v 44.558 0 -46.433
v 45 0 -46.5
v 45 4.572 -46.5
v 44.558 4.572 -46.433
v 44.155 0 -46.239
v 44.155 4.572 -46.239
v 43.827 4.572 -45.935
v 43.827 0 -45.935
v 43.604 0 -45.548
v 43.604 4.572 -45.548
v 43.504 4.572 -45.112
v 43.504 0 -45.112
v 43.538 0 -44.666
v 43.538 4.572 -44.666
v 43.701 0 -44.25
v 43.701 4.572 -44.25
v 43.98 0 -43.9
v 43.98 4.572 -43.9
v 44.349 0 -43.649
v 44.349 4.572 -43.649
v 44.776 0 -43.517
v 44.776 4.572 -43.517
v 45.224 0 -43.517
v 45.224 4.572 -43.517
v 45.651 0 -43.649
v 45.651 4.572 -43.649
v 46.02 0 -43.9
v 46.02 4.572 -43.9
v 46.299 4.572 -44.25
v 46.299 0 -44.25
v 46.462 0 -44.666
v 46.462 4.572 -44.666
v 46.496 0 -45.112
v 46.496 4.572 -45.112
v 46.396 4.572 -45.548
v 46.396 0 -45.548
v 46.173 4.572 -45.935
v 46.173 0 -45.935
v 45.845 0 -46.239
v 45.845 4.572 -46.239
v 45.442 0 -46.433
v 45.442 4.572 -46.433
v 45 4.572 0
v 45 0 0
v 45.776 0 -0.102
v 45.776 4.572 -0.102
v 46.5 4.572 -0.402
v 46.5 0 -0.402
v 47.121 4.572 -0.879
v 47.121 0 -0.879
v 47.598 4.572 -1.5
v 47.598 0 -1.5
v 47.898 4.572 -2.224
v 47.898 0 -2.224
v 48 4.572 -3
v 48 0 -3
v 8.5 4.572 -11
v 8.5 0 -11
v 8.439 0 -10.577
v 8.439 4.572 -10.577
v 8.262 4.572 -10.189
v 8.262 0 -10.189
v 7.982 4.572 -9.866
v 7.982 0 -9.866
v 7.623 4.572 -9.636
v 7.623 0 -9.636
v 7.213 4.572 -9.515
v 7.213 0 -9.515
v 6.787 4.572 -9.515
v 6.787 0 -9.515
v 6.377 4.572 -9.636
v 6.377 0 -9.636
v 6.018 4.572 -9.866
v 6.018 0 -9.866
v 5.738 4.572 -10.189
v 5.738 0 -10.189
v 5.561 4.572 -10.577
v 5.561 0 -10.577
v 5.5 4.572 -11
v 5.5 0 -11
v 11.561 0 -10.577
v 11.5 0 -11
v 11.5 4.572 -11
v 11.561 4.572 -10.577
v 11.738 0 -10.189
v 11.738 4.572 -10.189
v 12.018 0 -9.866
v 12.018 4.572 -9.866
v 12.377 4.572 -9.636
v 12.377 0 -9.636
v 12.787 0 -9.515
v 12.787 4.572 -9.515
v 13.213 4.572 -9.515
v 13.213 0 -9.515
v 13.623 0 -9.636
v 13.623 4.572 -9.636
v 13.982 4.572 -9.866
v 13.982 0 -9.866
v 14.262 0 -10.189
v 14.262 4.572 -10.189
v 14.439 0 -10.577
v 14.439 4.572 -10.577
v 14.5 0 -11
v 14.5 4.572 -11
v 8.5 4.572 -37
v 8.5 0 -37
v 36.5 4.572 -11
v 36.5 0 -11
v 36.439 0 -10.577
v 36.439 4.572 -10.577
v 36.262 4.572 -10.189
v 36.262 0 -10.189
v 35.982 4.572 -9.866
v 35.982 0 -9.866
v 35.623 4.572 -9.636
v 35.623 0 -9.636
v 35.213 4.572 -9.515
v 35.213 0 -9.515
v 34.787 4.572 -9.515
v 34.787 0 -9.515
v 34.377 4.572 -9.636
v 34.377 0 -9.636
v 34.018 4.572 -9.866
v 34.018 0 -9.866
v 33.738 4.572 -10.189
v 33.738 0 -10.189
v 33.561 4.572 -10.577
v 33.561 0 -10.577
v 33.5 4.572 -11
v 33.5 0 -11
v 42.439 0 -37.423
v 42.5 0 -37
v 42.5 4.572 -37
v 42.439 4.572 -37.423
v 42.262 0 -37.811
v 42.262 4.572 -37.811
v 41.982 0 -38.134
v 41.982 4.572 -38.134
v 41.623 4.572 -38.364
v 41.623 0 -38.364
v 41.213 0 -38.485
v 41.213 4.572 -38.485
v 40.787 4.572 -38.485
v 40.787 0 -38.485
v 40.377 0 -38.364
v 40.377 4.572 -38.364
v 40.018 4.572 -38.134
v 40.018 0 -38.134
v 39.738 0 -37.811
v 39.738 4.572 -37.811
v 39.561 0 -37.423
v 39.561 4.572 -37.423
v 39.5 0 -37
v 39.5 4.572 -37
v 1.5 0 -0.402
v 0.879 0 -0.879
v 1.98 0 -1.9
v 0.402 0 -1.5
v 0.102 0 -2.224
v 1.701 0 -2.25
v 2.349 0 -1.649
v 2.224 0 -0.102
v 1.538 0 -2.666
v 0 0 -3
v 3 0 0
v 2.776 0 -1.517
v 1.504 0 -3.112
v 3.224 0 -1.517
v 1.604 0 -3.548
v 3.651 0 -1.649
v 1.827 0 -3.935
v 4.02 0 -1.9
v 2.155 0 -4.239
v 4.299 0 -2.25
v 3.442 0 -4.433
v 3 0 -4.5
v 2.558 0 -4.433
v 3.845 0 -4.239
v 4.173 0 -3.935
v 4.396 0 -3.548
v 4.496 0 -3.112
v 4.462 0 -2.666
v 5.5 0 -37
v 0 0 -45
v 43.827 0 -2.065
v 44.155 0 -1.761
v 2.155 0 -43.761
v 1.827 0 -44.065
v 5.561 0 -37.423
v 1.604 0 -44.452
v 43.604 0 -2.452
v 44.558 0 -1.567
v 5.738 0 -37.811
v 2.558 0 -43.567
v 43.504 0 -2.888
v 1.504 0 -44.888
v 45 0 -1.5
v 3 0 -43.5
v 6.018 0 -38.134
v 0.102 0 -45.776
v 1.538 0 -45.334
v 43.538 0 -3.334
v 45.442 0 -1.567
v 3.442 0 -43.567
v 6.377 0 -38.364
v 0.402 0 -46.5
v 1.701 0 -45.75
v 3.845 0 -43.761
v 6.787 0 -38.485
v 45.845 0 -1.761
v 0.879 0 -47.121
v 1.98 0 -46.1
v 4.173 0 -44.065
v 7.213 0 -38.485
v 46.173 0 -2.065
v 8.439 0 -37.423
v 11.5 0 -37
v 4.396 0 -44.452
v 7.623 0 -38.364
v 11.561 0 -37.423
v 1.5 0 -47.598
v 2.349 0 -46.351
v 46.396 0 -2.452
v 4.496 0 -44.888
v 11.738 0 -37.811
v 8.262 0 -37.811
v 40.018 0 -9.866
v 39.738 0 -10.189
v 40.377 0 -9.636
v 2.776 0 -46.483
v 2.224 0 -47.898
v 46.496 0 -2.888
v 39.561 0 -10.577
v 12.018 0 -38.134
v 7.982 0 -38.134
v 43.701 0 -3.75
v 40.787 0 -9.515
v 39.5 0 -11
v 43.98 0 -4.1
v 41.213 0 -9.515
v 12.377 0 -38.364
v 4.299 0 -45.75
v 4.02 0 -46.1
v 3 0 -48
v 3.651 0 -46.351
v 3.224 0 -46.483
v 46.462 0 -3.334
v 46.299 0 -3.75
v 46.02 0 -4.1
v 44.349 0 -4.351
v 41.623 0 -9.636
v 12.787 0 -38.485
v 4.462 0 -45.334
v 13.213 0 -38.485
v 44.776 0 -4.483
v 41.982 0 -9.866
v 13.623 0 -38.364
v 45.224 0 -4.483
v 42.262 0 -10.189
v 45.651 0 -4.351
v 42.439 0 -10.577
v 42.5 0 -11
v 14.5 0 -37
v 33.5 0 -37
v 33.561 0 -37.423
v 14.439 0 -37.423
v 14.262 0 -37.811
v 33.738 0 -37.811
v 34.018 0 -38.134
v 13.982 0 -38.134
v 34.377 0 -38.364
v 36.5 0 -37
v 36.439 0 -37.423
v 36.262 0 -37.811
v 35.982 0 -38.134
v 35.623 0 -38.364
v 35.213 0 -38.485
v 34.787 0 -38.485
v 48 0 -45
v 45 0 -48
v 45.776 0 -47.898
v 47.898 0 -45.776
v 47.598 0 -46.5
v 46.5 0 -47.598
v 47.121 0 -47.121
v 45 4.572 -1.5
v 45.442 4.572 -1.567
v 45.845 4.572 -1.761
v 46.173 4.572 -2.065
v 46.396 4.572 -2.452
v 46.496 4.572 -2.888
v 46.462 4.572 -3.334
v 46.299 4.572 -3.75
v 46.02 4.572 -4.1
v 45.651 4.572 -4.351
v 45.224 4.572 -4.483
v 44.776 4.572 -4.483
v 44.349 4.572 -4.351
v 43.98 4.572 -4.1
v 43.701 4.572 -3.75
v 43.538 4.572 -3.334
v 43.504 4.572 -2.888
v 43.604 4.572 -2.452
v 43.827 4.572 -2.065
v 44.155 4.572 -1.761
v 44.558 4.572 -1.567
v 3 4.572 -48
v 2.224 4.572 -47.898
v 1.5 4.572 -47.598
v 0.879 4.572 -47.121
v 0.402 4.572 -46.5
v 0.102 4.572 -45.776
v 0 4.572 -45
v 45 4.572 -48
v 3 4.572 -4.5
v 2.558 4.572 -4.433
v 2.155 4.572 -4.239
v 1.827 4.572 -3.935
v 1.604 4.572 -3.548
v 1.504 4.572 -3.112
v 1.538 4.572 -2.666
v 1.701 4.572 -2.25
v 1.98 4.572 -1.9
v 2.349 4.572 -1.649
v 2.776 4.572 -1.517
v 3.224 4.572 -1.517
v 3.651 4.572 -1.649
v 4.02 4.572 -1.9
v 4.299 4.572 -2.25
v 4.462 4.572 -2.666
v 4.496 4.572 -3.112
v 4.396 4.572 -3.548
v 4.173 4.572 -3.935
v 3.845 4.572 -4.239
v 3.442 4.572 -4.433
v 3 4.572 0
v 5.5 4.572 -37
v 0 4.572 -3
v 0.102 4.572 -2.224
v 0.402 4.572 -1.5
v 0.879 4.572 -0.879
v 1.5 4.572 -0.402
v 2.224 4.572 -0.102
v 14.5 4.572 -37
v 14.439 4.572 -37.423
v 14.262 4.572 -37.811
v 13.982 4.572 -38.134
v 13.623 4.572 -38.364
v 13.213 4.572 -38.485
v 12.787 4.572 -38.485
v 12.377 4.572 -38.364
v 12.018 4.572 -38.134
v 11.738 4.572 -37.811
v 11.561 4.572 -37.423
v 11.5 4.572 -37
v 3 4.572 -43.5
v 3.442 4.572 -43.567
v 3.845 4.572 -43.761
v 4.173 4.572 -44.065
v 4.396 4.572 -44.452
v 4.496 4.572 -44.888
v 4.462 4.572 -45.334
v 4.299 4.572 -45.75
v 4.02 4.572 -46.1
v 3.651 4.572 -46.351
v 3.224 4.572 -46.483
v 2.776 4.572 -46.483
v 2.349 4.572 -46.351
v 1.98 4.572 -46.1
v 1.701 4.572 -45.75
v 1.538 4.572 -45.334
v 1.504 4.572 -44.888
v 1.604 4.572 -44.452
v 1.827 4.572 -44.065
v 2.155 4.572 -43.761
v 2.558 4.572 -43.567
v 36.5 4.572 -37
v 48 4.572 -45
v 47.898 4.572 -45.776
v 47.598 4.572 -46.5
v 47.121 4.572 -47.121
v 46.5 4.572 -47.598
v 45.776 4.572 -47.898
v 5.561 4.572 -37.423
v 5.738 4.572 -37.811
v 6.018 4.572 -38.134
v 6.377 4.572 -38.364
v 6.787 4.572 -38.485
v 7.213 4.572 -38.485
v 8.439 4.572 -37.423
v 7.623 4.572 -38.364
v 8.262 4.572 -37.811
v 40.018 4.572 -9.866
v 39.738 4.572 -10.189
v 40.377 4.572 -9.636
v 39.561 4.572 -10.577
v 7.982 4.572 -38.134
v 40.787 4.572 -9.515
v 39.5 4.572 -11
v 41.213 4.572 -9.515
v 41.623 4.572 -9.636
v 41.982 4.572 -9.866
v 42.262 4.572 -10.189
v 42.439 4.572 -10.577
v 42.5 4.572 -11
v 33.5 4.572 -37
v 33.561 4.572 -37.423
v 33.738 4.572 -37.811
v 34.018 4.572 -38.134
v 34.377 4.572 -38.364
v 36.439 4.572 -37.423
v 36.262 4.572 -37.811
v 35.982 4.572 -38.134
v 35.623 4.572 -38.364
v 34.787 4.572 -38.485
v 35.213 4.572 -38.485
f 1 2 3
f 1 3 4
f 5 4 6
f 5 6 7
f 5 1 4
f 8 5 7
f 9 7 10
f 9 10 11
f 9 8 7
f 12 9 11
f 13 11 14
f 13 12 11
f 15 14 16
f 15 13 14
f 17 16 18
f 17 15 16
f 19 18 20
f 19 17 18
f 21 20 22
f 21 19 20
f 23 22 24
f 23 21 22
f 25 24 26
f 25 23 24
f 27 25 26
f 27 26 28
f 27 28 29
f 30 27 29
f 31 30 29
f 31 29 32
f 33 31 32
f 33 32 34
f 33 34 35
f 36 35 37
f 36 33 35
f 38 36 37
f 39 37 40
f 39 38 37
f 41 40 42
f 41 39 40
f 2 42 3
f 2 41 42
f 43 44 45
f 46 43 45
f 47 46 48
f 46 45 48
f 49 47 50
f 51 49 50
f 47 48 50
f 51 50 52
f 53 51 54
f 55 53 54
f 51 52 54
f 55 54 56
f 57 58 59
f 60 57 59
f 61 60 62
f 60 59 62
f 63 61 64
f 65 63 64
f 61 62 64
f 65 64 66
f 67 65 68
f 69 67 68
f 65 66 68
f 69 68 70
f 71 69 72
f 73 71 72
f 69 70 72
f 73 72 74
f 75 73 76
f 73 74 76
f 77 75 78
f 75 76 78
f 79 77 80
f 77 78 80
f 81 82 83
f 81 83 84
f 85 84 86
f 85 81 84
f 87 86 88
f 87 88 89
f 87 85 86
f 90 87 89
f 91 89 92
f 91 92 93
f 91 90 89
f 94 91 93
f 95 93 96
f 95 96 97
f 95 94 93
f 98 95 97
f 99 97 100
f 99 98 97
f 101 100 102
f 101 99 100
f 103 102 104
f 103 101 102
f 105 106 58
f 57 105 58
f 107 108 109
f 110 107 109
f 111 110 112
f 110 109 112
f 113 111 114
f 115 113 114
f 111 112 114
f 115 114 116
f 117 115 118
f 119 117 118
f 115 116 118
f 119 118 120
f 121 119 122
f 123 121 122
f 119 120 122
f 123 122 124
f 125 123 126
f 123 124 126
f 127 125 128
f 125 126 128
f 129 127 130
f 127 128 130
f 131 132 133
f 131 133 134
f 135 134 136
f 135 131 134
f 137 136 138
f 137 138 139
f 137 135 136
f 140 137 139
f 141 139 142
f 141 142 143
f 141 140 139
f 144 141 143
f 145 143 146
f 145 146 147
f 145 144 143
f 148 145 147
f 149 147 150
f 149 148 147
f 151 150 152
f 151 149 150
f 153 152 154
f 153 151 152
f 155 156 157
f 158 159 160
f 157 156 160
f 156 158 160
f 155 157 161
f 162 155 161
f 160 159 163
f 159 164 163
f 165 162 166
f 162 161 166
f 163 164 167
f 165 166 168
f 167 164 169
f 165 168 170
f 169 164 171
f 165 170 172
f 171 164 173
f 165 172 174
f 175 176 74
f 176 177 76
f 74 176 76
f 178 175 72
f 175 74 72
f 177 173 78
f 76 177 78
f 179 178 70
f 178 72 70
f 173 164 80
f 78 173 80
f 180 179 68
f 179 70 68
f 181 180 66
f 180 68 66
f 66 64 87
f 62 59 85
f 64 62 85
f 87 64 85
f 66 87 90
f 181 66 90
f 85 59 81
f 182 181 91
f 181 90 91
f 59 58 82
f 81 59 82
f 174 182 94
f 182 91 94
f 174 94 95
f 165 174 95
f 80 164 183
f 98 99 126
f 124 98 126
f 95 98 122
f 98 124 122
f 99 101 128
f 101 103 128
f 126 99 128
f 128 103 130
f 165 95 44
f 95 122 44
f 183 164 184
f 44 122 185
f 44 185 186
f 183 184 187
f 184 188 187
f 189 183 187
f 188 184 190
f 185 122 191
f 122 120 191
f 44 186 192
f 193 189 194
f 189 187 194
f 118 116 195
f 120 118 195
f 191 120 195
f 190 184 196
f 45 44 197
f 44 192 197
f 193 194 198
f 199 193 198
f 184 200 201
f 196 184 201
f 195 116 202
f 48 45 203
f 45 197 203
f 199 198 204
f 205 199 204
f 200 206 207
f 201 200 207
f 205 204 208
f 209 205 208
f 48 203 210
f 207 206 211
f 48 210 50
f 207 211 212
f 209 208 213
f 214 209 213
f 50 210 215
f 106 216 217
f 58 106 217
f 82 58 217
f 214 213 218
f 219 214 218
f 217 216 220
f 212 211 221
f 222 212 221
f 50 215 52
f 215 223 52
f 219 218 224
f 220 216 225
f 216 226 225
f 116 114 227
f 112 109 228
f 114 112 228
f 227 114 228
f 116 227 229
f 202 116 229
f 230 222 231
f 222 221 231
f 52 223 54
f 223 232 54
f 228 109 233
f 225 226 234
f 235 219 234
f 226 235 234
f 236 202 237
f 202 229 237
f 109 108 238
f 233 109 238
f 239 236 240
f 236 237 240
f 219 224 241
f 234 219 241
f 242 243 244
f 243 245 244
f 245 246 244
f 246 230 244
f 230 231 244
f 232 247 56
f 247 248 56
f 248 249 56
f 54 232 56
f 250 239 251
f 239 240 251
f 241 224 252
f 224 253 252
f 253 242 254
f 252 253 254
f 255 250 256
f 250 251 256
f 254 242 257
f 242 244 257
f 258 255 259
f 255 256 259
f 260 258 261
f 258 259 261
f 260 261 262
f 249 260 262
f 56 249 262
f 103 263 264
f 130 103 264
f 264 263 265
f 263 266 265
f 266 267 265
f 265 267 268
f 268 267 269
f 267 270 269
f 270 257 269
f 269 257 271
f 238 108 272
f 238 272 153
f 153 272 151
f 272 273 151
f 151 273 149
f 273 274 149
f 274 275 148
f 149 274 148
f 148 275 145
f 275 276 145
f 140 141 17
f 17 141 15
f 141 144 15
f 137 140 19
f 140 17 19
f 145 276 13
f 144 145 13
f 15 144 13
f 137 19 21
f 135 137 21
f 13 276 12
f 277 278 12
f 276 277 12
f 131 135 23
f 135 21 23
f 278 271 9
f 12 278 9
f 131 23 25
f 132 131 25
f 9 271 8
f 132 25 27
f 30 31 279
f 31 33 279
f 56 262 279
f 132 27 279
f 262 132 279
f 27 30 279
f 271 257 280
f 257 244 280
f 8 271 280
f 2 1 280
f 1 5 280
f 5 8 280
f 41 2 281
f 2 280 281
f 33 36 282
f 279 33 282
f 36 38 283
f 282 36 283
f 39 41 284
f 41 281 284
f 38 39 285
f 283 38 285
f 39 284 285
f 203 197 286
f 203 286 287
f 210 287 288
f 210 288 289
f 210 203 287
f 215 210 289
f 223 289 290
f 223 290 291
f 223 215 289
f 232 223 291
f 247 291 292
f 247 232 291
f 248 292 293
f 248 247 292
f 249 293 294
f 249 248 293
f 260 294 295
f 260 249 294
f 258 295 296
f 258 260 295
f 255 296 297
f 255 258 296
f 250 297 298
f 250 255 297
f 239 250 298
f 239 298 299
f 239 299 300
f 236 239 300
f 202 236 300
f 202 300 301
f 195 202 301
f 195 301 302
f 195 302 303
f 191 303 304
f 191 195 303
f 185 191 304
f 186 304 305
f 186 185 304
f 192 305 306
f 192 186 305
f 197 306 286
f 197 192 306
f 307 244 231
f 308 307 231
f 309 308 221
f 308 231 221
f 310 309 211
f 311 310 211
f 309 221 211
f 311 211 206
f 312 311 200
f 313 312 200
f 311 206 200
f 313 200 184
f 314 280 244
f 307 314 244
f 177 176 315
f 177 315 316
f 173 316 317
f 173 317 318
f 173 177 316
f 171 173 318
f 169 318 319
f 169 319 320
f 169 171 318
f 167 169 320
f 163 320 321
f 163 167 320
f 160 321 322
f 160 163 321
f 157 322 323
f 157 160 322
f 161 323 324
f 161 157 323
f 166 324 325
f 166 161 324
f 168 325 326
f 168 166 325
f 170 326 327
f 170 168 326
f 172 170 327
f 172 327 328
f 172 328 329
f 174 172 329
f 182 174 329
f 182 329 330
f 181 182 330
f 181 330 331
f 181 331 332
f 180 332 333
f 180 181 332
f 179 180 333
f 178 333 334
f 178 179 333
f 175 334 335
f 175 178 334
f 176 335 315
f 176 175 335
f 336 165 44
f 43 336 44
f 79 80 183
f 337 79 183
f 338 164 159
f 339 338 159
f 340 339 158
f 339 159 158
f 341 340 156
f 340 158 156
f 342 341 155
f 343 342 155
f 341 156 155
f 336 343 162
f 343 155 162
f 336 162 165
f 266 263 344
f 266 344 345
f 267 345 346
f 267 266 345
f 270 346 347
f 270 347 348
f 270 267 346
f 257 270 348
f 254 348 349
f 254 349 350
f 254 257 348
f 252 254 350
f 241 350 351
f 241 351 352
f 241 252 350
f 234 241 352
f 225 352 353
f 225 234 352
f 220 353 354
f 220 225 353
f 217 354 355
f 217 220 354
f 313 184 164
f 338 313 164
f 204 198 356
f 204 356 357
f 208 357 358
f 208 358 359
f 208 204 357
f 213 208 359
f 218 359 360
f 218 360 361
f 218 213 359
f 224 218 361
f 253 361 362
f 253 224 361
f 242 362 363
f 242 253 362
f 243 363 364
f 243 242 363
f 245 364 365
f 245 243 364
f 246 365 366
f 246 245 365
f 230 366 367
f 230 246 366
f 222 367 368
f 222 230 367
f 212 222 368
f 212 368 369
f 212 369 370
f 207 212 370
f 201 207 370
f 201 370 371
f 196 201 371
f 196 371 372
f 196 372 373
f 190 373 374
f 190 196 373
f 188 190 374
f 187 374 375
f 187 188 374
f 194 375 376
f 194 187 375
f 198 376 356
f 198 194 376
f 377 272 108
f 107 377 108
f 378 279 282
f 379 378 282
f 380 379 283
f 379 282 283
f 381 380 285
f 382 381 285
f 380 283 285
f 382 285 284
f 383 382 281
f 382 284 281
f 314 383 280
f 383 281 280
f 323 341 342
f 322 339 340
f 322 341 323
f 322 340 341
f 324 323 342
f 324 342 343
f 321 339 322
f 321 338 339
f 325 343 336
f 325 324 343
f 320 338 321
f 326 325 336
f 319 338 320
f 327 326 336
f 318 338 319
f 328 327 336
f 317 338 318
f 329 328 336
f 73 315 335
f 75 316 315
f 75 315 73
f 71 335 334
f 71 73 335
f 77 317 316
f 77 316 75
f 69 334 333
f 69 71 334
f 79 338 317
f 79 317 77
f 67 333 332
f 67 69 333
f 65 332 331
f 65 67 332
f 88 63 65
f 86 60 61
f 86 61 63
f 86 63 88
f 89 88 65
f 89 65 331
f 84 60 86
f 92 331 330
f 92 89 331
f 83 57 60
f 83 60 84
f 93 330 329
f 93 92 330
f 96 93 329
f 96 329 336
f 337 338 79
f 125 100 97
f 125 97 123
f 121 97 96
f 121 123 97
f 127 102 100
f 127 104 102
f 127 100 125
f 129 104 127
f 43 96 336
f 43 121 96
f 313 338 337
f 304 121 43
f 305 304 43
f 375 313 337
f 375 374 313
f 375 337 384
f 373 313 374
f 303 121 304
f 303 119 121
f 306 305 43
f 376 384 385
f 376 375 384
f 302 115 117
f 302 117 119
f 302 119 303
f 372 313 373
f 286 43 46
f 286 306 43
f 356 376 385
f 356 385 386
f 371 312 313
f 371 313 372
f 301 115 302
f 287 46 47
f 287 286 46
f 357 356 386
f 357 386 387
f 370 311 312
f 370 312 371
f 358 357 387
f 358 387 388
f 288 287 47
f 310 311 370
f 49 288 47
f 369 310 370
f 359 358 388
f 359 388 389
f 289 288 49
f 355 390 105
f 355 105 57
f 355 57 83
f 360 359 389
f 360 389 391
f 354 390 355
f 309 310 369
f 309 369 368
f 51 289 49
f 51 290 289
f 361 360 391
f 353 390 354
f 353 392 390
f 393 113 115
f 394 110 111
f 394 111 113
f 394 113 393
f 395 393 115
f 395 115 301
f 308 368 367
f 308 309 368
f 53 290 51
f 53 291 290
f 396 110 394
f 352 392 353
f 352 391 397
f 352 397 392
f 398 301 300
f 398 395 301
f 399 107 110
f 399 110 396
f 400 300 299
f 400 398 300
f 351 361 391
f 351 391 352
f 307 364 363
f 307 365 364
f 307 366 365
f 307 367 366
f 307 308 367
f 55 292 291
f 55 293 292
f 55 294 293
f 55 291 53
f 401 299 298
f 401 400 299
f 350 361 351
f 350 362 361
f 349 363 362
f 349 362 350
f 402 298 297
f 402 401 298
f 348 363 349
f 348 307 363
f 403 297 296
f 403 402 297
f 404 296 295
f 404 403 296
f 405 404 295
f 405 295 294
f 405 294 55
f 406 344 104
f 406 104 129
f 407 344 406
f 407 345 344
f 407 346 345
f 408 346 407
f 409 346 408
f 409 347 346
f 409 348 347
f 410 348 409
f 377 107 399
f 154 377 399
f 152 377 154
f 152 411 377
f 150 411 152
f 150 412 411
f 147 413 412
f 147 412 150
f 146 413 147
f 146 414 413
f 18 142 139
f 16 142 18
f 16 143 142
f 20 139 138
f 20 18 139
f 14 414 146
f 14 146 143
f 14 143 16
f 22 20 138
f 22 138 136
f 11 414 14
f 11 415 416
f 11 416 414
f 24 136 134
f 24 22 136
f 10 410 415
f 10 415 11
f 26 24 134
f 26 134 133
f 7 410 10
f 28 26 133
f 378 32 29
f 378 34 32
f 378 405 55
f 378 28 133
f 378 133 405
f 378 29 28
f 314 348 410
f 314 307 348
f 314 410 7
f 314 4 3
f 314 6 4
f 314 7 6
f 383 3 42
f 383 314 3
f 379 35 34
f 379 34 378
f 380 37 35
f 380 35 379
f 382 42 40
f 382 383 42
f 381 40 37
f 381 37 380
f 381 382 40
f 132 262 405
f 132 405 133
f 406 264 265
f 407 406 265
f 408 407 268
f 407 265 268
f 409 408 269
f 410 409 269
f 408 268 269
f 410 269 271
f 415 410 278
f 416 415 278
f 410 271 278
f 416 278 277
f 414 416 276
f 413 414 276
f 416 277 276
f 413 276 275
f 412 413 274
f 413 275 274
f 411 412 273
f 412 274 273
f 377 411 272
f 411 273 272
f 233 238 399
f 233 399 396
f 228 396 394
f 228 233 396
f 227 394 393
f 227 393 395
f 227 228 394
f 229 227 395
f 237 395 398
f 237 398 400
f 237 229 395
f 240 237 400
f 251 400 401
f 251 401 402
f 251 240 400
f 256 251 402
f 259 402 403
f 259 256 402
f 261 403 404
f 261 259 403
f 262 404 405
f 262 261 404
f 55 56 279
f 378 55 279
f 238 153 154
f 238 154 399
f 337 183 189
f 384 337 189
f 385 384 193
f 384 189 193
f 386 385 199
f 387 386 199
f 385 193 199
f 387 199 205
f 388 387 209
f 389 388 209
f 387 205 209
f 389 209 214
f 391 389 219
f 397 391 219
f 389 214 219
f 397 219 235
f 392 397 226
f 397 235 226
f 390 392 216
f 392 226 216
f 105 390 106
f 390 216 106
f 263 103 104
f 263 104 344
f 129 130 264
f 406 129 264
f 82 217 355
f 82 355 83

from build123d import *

# Parameters (mm, degrees)
SKETCH3_R           = 1.5
BOSS_EXTRUDE1_DEPTH = 4.572


with BuildPart() as part:
    # Sketch3 → Boss-Extrude1 (new body)
    with BuildSketch(Plane(origin=(0, 0, 0), x_dir=(1, 0, 0), z_dir=(0, 1, 0))):
        with BuildLine():
            Line((3, 0), (45, 0))
            ThreePointArc((45, 0), (47.121320344, 0.878679656), (48, 3))
            Line((48, 3), (48, 45))
            ThreePointArc((48, 45), (47.121320344, 47.121320344), (45, 48))
            Line((45, 48), (3, 48))
            ThreePointArc((3, 48), (0.878679656, 47.121320344), (0, 45))
            Line((0, 45), (0, 3))
            ThreePointArc((0, 3), (0.878679656, 0.878679656), (3, 0))
        make_face()
        with Locations(Location((3, 45, 0), (0, 0, 270))):
            Circle(SKETCH3_R, mode=Mode.SUBTRACT)
        with Locations(Location((3, 3, 0), (0, 0, 90))):
            Circle(SKETCH3_R, mode=Mode.SUBTRACT)
        with Locations(Location((45, 3, 0), (0, 0, 270))):
            Circle(SKETCH3_R, mode=Mode.SUBTRACT)
        with Locations(Location((45, 45, 0), (0, 0, 90))):
            Circle(SKETCH3_R, mode=Mode.SUBTRACT)
        with BuildLine():
            Line((8.5, 37), (8.5, 11))
            ThreePointArc((8.5, 11), (7, 9.5), (5.5, 11))
            Line((5.5, 11), (5.5, 37))
            ThreePointArc((5.5, 37), (7, 38.5), (8.5, 37))
        make_face(mode=Mode.SUBTRACT)
        with BuildLine():
            Line((11.5, 37), (11.5, 11))
            ThreePointArc((11.5, 11), (13, 9.5), (14.5, 11))
            Line((14.5, 11), (14.5, 37))
            ThreePointArc((14.5, 37), (13, 38.5), (11.5, 37))
        make_face(mode=Mode.SUBTRACT)
        with BuildLine():
            Line((36.5, 37), (36.5, 11))
            ThreePointArc((36.5, 11), (35, 9.5), (33.5, 11))
            Line((33.5, 11), (33.5, 37))
            ThreePointArc((33.5, 37), (35, 38.5), (36.5, 37))
        make_face(mode=Mode.SUBTRACT)
        with BuildLine():
            Line((39.5, 37), (39.5, 11))
            ThreePointArc((39.5, 11), (41, 9.5), (42.5, 11))
            Line((42.5, 11), (42.5, 37))
            ThreePointArc((42.5, 37), (41, 38.5), (39.5, 37))
        make_face(mode=Mode.SUBTRACT)
    extrude(amount=BOSS_EXTRUDE1_DEPTH)


solid = part.part
